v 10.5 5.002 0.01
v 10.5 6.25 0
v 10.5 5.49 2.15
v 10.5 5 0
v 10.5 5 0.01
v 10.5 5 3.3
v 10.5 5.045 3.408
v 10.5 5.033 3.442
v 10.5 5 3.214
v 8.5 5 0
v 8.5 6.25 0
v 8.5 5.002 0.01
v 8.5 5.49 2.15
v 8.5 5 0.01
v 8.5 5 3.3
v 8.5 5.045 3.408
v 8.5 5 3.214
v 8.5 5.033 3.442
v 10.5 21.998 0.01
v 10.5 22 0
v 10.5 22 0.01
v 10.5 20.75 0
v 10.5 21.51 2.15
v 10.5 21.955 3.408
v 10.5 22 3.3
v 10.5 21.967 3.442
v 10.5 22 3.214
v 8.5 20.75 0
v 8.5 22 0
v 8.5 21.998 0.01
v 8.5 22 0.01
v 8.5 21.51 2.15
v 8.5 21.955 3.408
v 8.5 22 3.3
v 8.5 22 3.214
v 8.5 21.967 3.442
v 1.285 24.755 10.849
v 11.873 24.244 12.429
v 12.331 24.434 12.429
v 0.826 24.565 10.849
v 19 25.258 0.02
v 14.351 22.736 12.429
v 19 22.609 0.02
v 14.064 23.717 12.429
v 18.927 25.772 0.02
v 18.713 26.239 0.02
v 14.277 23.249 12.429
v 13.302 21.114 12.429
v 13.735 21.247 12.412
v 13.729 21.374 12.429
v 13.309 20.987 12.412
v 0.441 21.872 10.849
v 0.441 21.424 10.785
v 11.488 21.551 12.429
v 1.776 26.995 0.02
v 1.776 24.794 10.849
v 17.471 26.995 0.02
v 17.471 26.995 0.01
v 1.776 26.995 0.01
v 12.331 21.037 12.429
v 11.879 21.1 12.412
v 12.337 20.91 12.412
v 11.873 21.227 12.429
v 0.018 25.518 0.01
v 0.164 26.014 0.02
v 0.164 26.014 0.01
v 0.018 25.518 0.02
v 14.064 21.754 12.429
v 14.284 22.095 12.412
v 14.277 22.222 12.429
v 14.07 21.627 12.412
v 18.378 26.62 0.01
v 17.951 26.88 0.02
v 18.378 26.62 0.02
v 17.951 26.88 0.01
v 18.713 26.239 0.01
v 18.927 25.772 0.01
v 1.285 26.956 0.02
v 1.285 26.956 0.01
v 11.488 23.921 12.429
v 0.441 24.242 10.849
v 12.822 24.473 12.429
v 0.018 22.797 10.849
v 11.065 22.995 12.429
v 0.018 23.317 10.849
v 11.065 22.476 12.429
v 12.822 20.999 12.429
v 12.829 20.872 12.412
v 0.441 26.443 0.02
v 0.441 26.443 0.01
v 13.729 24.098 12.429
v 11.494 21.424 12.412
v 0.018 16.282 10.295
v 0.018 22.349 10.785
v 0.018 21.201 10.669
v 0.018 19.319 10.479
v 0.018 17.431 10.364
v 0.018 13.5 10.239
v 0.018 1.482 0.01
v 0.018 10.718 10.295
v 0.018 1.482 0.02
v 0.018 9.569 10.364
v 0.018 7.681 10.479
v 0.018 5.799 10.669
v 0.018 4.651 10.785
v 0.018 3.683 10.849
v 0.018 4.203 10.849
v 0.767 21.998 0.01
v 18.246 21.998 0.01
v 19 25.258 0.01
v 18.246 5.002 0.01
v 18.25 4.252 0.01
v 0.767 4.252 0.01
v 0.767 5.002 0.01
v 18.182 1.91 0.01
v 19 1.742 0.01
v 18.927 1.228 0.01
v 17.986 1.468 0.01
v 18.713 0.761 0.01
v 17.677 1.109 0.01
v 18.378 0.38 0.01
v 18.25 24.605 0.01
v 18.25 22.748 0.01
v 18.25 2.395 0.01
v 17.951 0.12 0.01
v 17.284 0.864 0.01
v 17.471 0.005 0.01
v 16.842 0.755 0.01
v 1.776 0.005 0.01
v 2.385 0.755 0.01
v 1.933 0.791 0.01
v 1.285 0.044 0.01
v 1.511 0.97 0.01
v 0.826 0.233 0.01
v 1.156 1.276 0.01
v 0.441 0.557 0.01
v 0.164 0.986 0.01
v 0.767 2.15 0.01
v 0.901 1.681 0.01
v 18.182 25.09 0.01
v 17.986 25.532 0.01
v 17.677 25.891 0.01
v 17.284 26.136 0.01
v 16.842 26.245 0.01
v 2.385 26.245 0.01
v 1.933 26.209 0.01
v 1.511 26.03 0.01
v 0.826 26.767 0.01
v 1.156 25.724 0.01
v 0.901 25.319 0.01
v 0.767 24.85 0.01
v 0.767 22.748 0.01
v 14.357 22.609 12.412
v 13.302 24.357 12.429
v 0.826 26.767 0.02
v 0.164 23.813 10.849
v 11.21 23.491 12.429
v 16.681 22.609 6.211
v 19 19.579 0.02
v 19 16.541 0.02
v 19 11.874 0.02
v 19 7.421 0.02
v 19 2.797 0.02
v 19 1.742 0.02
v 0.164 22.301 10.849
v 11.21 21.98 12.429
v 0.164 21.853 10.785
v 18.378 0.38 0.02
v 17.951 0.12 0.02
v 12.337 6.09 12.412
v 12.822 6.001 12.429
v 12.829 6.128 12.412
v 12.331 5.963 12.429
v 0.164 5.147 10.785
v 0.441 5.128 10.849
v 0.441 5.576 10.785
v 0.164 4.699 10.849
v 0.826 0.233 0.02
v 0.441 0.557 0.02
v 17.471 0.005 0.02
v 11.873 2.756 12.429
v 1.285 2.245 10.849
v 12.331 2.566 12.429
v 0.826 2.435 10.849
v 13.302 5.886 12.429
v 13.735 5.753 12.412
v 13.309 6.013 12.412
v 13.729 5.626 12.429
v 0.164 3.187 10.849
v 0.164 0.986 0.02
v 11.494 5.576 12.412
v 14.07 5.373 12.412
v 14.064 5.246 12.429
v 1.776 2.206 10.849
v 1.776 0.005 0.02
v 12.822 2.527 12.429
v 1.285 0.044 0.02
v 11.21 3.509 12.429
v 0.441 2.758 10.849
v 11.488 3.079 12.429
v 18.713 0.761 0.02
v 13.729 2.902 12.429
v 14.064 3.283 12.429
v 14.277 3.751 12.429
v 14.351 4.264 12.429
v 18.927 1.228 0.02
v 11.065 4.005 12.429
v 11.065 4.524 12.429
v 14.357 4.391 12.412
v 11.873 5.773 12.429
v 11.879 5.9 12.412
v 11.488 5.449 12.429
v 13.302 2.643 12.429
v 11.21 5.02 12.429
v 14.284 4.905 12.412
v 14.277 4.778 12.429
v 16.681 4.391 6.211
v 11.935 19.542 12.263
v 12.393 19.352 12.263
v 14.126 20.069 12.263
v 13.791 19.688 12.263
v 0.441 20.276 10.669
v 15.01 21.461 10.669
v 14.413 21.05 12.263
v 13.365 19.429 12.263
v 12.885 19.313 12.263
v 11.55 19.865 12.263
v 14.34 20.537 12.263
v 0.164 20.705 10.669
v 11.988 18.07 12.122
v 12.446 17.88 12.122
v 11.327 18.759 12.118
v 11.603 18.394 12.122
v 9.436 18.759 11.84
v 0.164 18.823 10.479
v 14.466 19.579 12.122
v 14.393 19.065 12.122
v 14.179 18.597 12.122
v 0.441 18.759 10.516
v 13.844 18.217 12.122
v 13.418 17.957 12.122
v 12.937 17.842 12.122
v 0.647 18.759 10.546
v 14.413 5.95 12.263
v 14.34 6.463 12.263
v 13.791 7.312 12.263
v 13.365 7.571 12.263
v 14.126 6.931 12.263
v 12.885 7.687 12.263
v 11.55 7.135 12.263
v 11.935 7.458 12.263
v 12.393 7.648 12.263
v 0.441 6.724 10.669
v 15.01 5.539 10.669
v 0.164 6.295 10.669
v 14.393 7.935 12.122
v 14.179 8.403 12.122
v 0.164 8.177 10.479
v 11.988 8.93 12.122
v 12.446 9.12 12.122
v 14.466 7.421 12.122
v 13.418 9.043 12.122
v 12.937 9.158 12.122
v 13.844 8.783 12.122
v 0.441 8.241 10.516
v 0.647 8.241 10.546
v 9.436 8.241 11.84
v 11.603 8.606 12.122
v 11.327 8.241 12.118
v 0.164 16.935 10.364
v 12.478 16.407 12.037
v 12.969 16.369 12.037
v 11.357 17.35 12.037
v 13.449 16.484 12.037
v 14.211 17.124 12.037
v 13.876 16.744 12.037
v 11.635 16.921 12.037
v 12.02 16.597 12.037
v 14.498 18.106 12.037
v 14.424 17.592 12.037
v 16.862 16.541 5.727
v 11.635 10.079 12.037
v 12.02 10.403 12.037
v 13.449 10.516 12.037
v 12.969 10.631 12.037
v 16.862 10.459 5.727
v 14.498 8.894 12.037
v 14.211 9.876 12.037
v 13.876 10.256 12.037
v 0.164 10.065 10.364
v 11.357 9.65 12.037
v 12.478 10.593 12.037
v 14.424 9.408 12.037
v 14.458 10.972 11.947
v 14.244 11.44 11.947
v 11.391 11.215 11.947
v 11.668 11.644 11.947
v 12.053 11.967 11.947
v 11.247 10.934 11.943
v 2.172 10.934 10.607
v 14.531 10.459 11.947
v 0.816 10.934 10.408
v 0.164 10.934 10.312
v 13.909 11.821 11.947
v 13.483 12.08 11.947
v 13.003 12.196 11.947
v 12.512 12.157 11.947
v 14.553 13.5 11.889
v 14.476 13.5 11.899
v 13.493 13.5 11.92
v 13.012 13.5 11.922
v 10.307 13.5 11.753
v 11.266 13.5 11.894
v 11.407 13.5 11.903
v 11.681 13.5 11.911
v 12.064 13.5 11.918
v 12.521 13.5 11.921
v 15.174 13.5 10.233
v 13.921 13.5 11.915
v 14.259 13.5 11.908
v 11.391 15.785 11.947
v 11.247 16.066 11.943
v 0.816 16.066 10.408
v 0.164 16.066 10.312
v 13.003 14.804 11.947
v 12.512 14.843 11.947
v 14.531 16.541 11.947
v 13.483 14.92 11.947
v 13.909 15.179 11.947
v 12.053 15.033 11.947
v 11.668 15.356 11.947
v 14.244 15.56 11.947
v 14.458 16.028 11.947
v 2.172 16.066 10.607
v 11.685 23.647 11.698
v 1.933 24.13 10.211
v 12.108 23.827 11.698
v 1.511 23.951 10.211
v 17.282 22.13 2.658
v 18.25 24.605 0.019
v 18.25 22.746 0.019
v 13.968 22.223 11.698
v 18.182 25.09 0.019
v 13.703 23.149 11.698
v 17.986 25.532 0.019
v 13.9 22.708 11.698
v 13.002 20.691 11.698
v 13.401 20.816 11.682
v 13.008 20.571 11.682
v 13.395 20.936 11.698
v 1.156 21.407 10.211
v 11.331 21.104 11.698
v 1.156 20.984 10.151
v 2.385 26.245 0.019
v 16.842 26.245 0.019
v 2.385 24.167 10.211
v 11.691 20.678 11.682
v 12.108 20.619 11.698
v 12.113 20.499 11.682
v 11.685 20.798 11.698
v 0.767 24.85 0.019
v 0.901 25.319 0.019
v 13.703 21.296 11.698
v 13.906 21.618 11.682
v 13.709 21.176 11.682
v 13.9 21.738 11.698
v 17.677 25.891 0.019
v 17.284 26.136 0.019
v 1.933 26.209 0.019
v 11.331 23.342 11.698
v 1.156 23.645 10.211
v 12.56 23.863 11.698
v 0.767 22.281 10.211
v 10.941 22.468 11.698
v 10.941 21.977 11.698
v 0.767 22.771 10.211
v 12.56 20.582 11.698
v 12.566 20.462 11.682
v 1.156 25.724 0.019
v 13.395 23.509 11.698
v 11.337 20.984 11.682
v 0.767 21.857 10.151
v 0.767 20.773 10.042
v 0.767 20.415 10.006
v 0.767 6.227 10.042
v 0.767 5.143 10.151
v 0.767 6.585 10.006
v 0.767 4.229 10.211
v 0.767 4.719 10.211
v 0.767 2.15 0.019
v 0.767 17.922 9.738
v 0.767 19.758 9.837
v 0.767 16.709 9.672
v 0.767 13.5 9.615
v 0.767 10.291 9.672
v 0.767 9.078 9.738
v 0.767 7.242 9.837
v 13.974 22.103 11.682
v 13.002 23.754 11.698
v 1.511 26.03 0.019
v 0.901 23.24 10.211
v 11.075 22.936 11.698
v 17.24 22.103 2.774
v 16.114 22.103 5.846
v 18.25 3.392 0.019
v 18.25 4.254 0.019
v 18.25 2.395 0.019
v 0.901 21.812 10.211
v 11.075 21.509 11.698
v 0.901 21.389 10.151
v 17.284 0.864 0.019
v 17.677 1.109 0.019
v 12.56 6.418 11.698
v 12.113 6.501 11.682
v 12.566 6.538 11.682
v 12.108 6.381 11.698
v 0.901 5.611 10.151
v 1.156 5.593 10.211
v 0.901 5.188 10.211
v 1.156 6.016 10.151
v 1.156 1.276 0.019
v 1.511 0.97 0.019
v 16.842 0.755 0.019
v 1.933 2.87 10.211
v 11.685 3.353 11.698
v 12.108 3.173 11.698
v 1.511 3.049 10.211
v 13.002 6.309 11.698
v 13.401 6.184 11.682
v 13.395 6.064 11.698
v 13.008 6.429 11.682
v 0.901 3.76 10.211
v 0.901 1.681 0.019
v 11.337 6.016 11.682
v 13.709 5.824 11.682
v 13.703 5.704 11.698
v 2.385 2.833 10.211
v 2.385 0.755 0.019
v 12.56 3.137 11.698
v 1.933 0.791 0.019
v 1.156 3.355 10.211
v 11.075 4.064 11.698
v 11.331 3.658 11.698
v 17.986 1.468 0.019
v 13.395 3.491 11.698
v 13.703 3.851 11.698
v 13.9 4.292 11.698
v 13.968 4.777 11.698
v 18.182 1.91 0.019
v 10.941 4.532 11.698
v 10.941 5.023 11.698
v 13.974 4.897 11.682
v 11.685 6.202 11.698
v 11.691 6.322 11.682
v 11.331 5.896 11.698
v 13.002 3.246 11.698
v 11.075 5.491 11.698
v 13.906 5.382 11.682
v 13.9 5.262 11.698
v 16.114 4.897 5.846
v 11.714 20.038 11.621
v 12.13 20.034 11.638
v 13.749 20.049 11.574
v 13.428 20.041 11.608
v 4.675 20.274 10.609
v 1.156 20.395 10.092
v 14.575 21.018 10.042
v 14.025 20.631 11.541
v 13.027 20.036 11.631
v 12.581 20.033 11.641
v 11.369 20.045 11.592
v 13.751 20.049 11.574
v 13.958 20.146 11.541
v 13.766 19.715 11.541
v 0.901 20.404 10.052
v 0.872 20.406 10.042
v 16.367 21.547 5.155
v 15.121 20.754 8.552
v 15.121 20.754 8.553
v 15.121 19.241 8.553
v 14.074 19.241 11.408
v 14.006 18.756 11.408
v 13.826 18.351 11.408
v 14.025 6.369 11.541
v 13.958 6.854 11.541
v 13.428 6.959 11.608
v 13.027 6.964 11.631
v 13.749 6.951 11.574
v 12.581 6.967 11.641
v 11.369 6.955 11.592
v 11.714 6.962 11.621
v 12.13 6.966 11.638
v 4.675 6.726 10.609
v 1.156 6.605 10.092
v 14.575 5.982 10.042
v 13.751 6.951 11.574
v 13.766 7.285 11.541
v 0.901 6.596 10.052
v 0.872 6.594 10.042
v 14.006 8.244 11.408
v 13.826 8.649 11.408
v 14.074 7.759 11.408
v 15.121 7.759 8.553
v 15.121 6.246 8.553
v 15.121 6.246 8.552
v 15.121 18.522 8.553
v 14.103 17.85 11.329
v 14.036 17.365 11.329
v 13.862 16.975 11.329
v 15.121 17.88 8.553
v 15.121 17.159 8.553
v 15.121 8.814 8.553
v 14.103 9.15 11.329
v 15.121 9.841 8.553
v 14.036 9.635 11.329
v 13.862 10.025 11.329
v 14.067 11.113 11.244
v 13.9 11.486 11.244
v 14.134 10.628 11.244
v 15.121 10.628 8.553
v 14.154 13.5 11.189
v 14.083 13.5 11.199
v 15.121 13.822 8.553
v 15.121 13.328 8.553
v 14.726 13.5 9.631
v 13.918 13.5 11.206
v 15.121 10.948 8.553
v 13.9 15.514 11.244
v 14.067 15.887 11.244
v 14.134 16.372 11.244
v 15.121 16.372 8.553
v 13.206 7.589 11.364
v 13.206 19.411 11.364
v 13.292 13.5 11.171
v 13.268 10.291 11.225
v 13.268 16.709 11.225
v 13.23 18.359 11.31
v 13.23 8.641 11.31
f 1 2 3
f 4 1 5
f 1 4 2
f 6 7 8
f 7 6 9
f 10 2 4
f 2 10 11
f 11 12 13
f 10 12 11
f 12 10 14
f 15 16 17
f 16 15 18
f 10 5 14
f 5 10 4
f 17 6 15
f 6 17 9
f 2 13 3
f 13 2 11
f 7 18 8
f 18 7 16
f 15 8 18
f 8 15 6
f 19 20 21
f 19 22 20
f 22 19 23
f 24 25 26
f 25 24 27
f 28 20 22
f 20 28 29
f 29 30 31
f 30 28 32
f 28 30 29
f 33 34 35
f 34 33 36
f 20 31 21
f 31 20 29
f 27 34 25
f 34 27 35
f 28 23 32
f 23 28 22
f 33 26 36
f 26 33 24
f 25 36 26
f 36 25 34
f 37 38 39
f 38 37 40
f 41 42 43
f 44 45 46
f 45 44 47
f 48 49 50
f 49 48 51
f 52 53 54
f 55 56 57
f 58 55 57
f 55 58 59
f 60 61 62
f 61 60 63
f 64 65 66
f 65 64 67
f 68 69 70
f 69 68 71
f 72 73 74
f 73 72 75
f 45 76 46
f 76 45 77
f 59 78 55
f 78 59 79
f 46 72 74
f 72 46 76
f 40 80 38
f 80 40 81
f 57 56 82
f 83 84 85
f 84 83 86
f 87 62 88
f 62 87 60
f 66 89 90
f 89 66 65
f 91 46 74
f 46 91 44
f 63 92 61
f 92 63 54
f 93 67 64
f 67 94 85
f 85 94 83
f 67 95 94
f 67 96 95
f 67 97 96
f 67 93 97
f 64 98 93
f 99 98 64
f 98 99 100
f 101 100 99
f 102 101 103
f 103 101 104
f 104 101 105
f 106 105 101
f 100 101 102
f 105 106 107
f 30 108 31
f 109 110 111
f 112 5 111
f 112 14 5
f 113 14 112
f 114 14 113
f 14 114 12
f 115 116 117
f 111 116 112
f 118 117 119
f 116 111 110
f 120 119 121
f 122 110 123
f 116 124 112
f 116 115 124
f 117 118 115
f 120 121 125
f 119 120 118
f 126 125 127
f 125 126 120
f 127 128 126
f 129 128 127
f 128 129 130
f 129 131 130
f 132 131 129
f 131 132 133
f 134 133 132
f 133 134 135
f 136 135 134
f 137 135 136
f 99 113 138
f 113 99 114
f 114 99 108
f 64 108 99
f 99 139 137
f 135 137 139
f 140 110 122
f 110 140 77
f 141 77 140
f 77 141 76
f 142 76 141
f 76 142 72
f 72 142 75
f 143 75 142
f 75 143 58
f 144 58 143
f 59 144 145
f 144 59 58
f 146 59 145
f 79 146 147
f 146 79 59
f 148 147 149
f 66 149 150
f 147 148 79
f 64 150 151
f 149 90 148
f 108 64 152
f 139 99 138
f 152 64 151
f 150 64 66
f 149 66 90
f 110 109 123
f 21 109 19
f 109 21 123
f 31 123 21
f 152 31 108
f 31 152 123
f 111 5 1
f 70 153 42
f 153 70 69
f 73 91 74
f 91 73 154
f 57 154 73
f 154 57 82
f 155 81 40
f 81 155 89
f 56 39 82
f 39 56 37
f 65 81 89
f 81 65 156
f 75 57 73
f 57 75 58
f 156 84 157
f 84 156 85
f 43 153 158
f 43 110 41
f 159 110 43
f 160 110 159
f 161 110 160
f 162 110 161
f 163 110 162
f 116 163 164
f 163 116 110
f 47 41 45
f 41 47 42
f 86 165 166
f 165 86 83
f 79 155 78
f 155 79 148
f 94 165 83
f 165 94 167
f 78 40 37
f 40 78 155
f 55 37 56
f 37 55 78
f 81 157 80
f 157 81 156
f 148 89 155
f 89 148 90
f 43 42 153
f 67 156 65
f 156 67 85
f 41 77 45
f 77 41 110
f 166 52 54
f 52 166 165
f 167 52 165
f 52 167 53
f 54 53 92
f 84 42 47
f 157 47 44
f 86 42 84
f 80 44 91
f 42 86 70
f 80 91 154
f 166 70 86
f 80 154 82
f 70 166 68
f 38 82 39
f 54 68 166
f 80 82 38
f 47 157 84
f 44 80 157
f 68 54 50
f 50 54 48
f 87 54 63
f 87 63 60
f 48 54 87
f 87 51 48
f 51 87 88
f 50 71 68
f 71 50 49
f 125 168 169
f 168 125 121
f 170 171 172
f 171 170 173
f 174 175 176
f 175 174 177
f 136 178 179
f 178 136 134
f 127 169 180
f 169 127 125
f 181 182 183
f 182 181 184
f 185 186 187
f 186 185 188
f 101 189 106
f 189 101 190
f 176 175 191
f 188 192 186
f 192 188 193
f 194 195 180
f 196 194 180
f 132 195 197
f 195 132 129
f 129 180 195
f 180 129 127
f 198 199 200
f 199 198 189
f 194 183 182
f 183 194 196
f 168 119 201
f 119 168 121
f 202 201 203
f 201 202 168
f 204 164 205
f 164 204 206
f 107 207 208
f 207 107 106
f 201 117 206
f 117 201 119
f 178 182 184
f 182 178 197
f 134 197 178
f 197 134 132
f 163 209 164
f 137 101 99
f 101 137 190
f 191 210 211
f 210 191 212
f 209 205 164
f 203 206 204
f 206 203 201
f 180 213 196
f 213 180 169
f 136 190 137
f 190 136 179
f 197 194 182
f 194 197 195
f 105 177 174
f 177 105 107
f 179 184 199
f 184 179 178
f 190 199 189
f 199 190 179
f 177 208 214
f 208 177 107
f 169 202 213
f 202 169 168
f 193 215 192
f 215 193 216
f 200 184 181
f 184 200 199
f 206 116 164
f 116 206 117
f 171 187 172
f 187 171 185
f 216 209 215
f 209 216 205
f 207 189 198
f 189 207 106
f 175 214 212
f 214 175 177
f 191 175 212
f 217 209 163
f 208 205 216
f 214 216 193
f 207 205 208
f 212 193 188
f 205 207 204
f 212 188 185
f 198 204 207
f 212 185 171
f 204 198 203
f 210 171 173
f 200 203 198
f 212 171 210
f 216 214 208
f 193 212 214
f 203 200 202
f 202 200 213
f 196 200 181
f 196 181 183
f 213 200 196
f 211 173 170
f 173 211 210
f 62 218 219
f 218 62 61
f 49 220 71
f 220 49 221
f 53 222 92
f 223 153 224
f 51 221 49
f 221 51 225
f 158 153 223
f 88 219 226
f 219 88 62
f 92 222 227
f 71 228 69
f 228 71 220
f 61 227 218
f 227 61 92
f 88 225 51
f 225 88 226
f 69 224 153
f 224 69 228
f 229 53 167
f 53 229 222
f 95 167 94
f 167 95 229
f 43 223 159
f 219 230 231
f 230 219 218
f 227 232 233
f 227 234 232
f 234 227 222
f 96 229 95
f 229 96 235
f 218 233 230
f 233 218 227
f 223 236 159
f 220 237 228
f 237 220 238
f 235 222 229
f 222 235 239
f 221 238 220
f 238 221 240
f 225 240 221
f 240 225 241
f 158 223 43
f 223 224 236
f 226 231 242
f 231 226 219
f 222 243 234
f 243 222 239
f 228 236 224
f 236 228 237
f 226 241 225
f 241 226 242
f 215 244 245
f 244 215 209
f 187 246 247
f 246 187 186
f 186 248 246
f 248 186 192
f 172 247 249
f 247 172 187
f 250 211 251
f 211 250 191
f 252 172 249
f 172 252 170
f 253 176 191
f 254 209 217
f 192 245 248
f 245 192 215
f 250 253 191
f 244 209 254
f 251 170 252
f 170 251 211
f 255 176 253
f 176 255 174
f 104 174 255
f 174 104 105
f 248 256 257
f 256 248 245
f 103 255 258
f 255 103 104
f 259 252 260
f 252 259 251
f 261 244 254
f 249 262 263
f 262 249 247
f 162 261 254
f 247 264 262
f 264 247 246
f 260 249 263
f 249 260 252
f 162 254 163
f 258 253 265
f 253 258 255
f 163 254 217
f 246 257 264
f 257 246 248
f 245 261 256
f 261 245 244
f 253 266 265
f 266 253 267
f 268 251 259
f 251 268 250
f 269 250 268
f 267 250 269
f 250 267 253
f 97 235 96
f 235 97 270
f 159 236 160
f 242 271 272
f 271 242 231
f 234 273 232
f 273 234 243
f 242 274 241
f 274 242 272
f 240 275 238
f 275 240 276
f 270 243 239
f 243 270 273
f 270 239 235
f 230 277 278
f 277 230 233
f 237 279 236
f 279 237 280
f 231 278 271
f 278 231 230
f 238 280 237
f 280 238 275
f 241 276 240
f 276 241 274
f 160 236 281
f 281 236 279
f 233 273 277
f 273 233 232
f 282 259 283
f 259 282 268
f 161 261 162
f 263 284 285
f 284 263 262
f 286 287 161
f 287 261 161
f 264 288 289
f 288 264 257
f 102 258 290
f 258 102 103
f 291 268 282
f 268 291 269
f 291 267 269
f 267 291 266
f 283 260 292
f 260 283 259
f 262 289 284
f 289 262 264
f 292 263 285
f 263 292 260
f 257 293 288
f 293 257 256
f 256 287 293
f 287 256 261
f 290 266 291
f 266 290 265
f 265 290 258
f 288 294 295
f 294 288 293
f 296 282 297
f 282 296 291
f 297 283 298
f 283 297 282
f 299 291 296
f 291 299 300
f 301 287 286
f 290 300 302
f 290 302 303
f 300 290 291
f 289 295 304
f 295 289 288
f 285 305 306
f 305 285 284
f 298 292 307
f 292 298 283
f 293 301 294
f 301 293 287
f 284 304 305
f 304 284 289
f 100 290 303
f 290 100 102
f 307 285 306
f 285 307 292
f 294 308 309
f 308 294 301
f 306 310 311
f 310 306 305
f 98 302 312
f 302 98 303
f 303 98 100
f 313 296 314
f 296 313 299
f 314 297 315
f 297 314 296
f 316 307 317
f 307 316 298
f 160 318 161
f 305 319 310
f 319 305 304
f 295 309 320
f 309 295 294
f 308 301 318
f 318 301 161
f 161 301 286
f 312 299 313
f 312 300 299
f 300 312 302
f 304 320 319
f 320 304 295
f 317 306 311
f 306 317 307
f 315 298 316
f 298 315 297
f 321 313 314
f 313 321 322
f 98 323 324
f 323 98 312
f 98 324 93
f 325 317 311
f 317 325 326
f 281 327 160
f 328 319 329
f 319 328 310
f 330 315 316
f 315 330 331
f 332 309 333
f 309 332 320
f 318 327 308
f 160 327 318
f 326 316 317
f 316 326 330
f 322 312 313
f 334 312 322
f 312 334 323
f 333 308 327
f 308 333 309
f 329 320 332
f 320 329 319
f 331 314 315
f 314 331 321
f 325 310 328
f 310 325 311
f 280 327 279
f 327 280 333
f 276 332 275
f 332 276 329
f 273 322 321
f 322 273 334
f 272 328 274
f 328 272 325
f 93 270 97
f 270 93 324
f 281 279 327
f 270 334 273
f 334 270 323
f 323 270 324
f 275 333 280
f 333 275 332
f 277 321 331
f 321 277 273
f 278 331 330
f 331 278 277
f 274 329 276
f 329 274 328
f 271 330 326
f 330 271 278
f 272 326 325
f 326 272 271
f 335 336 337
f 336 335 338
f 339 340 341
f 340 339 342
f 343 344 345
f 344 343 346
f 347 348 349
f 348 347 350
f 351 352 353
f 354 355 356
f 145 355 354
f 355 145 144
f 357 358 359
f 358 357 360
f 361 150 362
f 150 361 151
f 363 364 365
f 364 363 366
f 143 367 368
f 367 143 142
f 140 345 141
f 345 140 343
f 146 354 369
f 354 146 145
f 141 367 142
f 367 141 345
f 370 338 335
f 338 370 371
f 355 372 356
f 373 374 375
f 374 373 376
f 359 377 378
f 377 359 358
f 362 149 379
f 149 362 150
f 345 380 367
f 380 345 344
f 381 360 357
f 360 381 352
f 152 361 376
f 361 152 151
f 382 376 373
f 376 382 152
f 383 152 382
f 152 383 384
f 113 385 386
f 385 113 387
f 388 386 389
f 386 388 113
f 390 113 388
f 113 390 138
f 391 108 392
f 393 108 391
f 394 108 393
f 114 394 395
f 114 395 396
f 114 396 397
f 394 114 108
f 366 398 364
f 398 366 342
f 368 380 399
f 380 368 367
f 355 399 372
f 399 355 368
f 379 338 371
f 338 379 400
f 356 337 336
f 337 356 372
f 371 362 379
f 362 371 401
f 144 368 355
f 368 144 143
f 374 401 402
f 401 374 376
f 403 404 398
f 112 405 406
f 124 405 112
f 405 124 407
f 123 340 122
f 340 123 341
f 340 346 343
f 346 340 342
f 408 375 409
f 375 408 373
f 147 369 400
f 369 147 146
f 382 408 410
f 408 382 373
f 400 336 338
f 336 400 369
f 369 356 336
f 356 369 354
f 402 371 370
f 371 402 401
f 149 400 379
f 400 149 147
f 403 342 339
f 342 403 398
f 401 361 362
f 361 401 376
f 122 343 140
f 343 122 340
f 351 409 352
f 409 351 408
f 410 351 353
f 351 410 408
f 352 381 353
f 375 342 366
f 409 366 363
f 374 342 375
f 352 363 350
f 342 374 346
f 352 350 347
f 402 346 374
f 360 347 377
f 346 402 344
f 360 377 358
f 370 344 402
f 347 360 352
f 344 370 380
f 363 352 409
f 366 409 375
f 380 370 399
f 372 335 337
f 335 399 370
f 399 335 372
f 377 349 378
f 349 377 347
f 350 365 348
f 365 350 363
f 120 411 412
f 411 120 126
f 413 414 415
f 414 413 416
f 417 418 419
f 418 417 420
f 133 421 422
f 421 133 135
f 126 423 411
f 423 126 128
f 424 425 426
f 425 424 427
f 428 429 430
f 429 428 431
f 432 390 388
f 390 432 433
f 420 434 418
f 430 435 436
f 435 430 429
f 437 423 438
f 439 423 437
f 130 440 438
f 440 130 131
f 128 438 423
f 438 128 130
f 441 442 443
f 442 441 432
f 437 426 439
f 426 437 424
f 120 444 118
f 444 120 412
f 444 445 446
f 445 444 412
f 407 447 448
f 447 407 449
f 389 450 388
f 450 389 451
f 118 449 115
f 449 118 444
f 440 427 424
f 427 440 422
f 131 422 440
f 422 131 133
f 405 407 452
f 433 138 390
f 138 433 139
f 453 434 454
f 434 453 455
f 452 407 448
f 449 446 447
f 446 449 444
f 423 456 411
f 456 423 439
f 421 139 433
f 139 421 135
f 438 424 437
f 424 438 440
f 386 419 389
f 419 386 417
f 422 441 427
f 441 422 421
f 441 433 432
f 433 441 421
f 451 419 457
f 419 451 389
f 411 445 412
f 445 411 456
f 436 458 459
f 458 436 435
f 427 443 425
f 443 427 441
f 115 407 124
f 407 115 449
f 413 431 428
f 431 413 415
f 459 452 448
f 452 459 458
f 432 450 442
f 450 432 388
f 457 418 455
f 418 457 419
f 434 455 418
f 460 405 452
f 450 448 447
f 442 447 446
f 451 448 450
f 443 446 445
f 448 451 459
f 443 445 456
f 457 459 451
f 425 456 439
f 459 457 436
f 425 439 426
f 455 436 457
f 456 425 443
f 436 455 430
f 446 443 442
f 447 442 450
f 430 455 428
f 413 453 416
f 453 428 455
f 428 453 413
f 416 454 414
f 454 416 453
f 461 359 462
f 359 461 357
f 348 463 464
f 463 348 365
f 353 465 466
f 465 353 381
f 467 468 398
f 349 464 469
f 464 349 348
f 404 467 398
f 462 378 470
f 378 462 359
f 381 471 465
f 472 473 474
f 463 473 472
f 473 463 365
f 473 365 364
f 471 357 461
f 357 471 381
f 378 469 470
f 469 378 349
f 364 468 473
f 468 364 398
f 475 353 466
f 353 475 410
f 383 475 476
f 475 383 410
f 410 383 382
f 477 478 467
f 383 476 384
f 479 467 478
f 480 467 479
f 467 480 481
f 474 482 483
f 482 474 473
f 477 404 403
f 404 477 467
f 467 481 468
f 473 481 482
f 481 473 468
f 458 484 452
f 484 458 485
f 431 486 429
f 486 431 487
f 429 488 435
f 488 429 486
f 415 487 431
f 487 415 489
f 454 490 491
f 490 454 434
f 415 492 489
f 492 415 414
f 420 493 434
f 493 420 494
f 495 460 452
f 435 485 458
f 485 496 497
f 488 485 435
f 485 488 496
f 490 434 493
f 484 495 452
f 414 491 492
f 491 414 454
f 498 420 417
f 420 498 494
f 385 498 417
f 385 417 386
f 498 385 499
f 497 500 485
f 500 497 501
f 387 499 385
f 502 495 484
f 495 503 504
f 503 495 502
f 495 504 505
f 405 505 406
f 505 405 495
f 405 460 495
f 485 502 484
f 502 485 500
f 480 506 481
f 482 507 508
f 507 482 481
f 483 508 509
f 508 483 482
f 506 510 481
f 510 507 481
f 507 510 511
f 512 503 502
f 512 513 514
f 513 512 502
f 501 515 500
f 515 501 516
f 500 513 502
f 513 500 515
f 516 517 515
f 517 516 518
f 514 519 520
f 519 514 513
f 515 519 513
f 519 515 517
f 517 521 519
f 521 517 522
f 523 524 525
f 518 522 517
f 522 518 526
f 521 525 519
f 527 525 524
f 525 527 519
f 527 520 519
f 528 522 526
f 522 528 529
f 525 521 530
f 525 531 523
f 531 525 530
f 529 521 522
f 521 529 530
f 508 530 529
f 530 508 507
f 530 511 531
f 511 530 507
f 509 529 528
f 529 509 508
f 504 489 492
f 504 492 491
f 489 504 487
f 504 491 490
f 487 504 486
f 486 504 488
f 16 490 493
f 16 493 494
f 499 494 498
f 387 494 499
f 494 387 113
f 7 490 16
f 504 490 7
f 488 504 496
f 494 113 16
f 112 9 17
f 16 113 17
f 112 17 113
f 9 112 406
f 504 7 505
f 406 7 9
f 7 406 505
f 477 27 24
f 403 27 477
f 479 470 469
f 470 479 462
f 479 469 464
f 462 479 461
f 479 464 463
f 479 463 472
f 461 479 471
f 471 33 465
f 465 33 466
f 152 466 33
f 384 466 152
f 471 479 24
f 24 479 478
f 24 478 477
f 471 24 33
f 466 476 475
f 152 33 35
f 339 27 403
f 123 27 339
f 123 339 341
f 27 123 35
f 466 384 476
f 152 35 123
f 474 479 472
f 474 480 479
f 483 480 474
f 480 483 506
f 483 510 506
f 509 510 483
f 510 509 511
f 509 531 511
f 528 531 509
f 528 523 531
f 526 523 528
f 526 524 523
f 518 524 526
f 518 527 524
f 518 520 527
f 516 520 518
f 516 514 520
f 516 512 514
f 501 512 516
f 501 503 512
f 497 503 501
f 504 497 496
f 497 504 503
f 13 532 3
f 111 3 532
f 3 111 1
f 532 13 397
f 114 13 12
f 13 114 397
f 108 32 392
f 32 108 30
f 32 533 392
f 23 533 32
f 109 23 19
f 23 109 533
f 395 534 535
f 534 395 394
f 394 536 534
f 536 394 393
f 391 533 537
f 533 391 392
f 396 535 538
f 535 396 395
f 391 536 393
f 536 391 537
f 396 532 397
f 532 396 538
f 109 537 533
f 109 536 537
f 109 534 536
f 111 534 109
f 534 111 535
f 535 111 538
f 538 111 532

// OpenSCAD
//measures are in millimeters
AY=27.0;
AX=19.0;
INNER_AY=18.5;
INNER_BY=12.5;
BY=22.0;
BLX=14.5;
EZ=11.0;
FLZ=14.0;
H=12.75;
CYL_OFF_Z=100;
CYL_DEPTH=0.05;
CLIP_X=2;
CLIP_Y=1.25;
CLIP_H=3*CLIP_Y;
CLIP_DISTANCE=17.0;
CORNER_RADIUS=2;

WallThickness=0.75;
ClipWidth=2.2;
ClipDepth=0.75;

//ascfront=FLZ/sqrt(pow(FLZ,2)-pow(H,2));
//asctop=(H-EZ)/sqrt(pow(BLX,2)-pow((H-EZ),2));

//curve control rod
//translate([14,4,0]) cube([1,1,H]);

alpha=asin((H-EZ)/BLX);
beta=asin(H/FLZ);
gamma=90-asin((0.5*(AY-BY))/EZ);

module keycap(){
	scale([AX/(AX+2*CORNER_RADIUS),AY/(AY+2*CORNER_RADIUS),1])
	translate([CORNER_RADIUS,CORNER_RADIUS,0.01])
	minkowski(){
		difference(){
			cube([AX,AY,H]);
			rotate(a=gamma,v=[1,0,0]) cube([100,100,100]);
			translate([0,AY,0]) rotate(a=90-gamma,v=[1,0,0]) cube([100,100,100]);
			translate([0,0,EZ]) rotate(a=-alpha,v=[0,1,0]) translate([-50,0,0]) cube([100,100,100]);
			translate([0,AY/2,EZ+CYL_OFF_Z]) rotate(a=90-alpha,v=[0,1,0]) cylinder(h=100,center=true,r=CYL_OFF_Z+CYL_DEPTH,$fa=2);
			translate([AX,0,0]) rotate(a=beta-90,v=[0,1,0]) cube([100,100,100]);
		}
		cylinder(h=0.01,r=CORNER_RADIUS,$fs=0.6);
		//rotate(a=90,v=[1,0,0]) cylinder(h=0.01,r=1,$fs=0.3);
	}
}

module struts(){
	difference(){
		cube([AX,INNER_AY,H]);
		rotate(a=gamma,v=[1,0,0]) cube([100,100,100]);
		translate([0,INNER_AY,0]) rotate(a=90-gamma,v=[1,0,0]) cube([100,100,100]);
		translate([0,0,EZ]) rotate(a=-alpha,v=[0,1,0]) translate([-50,0,0]) cube([100,100,100]);
		translate([0,INNER_AY/2,EZ+CYL_OFF_Z]) rotate(a=90-alpha,v=[0,1,0]) cylinder(h=100,center=true,r=CYL_OFF_Z+CYL_DEPTH,$fa=2);
		translate([AX,0,0]) rotate(a=beta-90,v=[0,1,0]) cube([100,100,100]);
	}
}

module clip(){
	difference(){
		cube([CLIP_X,CLIP_Y,CLIP_H]);
		translate([-1,CLIP_Y,0]) rotate(a=asin(CLIP_Y/CLIP_H),v=[1,0,0]) cube([100,100,100]);
        rotate(a=gamma, v=[1, 0, 0]) translate([-1, 0, WallThickness]) cube([100, 100, 100]);
	}
}

//clip distance control rod
//translate([(AX-CLIP_X)/2,(AY-CLIP_DISTANCE)/2,0]) cube([1,CLIP_DISTANCE,1]);
translate([(AX-CLIP_X)/2,(AY-CLIP_DISTANCE)/2,0]) clip();
translate([(AX-CLIP_X)/2,(AY+CLIP_DISTANCE)/2,0]) mirror([0,1,0]) clip();

difference(){
	keycap();
	difference(){
		translate([WallThickness, WallThickness, 0]) scale(v=[1-2*WallThickness/AX, 1-2*WallThickness/AY, 1-WallThickness/H]) keycap();
		translate([0,(AY-INNER_AY)/2,0]) difference(){
			struts();
			translate([WallThickness, WallThickness, 0]) scale(v=[1-2*WallThickness/AX, 1-2*WallThickness/INNER_AY, 1-WallThickness/H]) struts();
		}
		//translate([0,(AY-CLIP_DISTANCE)/2-WallThickness,0]) cube([100,WallThickness, 100]);
		//translate([0,(AY+CLIP_DISTANCE)/2,0]) cube([100,WallThickness, 100]);
	}
}
